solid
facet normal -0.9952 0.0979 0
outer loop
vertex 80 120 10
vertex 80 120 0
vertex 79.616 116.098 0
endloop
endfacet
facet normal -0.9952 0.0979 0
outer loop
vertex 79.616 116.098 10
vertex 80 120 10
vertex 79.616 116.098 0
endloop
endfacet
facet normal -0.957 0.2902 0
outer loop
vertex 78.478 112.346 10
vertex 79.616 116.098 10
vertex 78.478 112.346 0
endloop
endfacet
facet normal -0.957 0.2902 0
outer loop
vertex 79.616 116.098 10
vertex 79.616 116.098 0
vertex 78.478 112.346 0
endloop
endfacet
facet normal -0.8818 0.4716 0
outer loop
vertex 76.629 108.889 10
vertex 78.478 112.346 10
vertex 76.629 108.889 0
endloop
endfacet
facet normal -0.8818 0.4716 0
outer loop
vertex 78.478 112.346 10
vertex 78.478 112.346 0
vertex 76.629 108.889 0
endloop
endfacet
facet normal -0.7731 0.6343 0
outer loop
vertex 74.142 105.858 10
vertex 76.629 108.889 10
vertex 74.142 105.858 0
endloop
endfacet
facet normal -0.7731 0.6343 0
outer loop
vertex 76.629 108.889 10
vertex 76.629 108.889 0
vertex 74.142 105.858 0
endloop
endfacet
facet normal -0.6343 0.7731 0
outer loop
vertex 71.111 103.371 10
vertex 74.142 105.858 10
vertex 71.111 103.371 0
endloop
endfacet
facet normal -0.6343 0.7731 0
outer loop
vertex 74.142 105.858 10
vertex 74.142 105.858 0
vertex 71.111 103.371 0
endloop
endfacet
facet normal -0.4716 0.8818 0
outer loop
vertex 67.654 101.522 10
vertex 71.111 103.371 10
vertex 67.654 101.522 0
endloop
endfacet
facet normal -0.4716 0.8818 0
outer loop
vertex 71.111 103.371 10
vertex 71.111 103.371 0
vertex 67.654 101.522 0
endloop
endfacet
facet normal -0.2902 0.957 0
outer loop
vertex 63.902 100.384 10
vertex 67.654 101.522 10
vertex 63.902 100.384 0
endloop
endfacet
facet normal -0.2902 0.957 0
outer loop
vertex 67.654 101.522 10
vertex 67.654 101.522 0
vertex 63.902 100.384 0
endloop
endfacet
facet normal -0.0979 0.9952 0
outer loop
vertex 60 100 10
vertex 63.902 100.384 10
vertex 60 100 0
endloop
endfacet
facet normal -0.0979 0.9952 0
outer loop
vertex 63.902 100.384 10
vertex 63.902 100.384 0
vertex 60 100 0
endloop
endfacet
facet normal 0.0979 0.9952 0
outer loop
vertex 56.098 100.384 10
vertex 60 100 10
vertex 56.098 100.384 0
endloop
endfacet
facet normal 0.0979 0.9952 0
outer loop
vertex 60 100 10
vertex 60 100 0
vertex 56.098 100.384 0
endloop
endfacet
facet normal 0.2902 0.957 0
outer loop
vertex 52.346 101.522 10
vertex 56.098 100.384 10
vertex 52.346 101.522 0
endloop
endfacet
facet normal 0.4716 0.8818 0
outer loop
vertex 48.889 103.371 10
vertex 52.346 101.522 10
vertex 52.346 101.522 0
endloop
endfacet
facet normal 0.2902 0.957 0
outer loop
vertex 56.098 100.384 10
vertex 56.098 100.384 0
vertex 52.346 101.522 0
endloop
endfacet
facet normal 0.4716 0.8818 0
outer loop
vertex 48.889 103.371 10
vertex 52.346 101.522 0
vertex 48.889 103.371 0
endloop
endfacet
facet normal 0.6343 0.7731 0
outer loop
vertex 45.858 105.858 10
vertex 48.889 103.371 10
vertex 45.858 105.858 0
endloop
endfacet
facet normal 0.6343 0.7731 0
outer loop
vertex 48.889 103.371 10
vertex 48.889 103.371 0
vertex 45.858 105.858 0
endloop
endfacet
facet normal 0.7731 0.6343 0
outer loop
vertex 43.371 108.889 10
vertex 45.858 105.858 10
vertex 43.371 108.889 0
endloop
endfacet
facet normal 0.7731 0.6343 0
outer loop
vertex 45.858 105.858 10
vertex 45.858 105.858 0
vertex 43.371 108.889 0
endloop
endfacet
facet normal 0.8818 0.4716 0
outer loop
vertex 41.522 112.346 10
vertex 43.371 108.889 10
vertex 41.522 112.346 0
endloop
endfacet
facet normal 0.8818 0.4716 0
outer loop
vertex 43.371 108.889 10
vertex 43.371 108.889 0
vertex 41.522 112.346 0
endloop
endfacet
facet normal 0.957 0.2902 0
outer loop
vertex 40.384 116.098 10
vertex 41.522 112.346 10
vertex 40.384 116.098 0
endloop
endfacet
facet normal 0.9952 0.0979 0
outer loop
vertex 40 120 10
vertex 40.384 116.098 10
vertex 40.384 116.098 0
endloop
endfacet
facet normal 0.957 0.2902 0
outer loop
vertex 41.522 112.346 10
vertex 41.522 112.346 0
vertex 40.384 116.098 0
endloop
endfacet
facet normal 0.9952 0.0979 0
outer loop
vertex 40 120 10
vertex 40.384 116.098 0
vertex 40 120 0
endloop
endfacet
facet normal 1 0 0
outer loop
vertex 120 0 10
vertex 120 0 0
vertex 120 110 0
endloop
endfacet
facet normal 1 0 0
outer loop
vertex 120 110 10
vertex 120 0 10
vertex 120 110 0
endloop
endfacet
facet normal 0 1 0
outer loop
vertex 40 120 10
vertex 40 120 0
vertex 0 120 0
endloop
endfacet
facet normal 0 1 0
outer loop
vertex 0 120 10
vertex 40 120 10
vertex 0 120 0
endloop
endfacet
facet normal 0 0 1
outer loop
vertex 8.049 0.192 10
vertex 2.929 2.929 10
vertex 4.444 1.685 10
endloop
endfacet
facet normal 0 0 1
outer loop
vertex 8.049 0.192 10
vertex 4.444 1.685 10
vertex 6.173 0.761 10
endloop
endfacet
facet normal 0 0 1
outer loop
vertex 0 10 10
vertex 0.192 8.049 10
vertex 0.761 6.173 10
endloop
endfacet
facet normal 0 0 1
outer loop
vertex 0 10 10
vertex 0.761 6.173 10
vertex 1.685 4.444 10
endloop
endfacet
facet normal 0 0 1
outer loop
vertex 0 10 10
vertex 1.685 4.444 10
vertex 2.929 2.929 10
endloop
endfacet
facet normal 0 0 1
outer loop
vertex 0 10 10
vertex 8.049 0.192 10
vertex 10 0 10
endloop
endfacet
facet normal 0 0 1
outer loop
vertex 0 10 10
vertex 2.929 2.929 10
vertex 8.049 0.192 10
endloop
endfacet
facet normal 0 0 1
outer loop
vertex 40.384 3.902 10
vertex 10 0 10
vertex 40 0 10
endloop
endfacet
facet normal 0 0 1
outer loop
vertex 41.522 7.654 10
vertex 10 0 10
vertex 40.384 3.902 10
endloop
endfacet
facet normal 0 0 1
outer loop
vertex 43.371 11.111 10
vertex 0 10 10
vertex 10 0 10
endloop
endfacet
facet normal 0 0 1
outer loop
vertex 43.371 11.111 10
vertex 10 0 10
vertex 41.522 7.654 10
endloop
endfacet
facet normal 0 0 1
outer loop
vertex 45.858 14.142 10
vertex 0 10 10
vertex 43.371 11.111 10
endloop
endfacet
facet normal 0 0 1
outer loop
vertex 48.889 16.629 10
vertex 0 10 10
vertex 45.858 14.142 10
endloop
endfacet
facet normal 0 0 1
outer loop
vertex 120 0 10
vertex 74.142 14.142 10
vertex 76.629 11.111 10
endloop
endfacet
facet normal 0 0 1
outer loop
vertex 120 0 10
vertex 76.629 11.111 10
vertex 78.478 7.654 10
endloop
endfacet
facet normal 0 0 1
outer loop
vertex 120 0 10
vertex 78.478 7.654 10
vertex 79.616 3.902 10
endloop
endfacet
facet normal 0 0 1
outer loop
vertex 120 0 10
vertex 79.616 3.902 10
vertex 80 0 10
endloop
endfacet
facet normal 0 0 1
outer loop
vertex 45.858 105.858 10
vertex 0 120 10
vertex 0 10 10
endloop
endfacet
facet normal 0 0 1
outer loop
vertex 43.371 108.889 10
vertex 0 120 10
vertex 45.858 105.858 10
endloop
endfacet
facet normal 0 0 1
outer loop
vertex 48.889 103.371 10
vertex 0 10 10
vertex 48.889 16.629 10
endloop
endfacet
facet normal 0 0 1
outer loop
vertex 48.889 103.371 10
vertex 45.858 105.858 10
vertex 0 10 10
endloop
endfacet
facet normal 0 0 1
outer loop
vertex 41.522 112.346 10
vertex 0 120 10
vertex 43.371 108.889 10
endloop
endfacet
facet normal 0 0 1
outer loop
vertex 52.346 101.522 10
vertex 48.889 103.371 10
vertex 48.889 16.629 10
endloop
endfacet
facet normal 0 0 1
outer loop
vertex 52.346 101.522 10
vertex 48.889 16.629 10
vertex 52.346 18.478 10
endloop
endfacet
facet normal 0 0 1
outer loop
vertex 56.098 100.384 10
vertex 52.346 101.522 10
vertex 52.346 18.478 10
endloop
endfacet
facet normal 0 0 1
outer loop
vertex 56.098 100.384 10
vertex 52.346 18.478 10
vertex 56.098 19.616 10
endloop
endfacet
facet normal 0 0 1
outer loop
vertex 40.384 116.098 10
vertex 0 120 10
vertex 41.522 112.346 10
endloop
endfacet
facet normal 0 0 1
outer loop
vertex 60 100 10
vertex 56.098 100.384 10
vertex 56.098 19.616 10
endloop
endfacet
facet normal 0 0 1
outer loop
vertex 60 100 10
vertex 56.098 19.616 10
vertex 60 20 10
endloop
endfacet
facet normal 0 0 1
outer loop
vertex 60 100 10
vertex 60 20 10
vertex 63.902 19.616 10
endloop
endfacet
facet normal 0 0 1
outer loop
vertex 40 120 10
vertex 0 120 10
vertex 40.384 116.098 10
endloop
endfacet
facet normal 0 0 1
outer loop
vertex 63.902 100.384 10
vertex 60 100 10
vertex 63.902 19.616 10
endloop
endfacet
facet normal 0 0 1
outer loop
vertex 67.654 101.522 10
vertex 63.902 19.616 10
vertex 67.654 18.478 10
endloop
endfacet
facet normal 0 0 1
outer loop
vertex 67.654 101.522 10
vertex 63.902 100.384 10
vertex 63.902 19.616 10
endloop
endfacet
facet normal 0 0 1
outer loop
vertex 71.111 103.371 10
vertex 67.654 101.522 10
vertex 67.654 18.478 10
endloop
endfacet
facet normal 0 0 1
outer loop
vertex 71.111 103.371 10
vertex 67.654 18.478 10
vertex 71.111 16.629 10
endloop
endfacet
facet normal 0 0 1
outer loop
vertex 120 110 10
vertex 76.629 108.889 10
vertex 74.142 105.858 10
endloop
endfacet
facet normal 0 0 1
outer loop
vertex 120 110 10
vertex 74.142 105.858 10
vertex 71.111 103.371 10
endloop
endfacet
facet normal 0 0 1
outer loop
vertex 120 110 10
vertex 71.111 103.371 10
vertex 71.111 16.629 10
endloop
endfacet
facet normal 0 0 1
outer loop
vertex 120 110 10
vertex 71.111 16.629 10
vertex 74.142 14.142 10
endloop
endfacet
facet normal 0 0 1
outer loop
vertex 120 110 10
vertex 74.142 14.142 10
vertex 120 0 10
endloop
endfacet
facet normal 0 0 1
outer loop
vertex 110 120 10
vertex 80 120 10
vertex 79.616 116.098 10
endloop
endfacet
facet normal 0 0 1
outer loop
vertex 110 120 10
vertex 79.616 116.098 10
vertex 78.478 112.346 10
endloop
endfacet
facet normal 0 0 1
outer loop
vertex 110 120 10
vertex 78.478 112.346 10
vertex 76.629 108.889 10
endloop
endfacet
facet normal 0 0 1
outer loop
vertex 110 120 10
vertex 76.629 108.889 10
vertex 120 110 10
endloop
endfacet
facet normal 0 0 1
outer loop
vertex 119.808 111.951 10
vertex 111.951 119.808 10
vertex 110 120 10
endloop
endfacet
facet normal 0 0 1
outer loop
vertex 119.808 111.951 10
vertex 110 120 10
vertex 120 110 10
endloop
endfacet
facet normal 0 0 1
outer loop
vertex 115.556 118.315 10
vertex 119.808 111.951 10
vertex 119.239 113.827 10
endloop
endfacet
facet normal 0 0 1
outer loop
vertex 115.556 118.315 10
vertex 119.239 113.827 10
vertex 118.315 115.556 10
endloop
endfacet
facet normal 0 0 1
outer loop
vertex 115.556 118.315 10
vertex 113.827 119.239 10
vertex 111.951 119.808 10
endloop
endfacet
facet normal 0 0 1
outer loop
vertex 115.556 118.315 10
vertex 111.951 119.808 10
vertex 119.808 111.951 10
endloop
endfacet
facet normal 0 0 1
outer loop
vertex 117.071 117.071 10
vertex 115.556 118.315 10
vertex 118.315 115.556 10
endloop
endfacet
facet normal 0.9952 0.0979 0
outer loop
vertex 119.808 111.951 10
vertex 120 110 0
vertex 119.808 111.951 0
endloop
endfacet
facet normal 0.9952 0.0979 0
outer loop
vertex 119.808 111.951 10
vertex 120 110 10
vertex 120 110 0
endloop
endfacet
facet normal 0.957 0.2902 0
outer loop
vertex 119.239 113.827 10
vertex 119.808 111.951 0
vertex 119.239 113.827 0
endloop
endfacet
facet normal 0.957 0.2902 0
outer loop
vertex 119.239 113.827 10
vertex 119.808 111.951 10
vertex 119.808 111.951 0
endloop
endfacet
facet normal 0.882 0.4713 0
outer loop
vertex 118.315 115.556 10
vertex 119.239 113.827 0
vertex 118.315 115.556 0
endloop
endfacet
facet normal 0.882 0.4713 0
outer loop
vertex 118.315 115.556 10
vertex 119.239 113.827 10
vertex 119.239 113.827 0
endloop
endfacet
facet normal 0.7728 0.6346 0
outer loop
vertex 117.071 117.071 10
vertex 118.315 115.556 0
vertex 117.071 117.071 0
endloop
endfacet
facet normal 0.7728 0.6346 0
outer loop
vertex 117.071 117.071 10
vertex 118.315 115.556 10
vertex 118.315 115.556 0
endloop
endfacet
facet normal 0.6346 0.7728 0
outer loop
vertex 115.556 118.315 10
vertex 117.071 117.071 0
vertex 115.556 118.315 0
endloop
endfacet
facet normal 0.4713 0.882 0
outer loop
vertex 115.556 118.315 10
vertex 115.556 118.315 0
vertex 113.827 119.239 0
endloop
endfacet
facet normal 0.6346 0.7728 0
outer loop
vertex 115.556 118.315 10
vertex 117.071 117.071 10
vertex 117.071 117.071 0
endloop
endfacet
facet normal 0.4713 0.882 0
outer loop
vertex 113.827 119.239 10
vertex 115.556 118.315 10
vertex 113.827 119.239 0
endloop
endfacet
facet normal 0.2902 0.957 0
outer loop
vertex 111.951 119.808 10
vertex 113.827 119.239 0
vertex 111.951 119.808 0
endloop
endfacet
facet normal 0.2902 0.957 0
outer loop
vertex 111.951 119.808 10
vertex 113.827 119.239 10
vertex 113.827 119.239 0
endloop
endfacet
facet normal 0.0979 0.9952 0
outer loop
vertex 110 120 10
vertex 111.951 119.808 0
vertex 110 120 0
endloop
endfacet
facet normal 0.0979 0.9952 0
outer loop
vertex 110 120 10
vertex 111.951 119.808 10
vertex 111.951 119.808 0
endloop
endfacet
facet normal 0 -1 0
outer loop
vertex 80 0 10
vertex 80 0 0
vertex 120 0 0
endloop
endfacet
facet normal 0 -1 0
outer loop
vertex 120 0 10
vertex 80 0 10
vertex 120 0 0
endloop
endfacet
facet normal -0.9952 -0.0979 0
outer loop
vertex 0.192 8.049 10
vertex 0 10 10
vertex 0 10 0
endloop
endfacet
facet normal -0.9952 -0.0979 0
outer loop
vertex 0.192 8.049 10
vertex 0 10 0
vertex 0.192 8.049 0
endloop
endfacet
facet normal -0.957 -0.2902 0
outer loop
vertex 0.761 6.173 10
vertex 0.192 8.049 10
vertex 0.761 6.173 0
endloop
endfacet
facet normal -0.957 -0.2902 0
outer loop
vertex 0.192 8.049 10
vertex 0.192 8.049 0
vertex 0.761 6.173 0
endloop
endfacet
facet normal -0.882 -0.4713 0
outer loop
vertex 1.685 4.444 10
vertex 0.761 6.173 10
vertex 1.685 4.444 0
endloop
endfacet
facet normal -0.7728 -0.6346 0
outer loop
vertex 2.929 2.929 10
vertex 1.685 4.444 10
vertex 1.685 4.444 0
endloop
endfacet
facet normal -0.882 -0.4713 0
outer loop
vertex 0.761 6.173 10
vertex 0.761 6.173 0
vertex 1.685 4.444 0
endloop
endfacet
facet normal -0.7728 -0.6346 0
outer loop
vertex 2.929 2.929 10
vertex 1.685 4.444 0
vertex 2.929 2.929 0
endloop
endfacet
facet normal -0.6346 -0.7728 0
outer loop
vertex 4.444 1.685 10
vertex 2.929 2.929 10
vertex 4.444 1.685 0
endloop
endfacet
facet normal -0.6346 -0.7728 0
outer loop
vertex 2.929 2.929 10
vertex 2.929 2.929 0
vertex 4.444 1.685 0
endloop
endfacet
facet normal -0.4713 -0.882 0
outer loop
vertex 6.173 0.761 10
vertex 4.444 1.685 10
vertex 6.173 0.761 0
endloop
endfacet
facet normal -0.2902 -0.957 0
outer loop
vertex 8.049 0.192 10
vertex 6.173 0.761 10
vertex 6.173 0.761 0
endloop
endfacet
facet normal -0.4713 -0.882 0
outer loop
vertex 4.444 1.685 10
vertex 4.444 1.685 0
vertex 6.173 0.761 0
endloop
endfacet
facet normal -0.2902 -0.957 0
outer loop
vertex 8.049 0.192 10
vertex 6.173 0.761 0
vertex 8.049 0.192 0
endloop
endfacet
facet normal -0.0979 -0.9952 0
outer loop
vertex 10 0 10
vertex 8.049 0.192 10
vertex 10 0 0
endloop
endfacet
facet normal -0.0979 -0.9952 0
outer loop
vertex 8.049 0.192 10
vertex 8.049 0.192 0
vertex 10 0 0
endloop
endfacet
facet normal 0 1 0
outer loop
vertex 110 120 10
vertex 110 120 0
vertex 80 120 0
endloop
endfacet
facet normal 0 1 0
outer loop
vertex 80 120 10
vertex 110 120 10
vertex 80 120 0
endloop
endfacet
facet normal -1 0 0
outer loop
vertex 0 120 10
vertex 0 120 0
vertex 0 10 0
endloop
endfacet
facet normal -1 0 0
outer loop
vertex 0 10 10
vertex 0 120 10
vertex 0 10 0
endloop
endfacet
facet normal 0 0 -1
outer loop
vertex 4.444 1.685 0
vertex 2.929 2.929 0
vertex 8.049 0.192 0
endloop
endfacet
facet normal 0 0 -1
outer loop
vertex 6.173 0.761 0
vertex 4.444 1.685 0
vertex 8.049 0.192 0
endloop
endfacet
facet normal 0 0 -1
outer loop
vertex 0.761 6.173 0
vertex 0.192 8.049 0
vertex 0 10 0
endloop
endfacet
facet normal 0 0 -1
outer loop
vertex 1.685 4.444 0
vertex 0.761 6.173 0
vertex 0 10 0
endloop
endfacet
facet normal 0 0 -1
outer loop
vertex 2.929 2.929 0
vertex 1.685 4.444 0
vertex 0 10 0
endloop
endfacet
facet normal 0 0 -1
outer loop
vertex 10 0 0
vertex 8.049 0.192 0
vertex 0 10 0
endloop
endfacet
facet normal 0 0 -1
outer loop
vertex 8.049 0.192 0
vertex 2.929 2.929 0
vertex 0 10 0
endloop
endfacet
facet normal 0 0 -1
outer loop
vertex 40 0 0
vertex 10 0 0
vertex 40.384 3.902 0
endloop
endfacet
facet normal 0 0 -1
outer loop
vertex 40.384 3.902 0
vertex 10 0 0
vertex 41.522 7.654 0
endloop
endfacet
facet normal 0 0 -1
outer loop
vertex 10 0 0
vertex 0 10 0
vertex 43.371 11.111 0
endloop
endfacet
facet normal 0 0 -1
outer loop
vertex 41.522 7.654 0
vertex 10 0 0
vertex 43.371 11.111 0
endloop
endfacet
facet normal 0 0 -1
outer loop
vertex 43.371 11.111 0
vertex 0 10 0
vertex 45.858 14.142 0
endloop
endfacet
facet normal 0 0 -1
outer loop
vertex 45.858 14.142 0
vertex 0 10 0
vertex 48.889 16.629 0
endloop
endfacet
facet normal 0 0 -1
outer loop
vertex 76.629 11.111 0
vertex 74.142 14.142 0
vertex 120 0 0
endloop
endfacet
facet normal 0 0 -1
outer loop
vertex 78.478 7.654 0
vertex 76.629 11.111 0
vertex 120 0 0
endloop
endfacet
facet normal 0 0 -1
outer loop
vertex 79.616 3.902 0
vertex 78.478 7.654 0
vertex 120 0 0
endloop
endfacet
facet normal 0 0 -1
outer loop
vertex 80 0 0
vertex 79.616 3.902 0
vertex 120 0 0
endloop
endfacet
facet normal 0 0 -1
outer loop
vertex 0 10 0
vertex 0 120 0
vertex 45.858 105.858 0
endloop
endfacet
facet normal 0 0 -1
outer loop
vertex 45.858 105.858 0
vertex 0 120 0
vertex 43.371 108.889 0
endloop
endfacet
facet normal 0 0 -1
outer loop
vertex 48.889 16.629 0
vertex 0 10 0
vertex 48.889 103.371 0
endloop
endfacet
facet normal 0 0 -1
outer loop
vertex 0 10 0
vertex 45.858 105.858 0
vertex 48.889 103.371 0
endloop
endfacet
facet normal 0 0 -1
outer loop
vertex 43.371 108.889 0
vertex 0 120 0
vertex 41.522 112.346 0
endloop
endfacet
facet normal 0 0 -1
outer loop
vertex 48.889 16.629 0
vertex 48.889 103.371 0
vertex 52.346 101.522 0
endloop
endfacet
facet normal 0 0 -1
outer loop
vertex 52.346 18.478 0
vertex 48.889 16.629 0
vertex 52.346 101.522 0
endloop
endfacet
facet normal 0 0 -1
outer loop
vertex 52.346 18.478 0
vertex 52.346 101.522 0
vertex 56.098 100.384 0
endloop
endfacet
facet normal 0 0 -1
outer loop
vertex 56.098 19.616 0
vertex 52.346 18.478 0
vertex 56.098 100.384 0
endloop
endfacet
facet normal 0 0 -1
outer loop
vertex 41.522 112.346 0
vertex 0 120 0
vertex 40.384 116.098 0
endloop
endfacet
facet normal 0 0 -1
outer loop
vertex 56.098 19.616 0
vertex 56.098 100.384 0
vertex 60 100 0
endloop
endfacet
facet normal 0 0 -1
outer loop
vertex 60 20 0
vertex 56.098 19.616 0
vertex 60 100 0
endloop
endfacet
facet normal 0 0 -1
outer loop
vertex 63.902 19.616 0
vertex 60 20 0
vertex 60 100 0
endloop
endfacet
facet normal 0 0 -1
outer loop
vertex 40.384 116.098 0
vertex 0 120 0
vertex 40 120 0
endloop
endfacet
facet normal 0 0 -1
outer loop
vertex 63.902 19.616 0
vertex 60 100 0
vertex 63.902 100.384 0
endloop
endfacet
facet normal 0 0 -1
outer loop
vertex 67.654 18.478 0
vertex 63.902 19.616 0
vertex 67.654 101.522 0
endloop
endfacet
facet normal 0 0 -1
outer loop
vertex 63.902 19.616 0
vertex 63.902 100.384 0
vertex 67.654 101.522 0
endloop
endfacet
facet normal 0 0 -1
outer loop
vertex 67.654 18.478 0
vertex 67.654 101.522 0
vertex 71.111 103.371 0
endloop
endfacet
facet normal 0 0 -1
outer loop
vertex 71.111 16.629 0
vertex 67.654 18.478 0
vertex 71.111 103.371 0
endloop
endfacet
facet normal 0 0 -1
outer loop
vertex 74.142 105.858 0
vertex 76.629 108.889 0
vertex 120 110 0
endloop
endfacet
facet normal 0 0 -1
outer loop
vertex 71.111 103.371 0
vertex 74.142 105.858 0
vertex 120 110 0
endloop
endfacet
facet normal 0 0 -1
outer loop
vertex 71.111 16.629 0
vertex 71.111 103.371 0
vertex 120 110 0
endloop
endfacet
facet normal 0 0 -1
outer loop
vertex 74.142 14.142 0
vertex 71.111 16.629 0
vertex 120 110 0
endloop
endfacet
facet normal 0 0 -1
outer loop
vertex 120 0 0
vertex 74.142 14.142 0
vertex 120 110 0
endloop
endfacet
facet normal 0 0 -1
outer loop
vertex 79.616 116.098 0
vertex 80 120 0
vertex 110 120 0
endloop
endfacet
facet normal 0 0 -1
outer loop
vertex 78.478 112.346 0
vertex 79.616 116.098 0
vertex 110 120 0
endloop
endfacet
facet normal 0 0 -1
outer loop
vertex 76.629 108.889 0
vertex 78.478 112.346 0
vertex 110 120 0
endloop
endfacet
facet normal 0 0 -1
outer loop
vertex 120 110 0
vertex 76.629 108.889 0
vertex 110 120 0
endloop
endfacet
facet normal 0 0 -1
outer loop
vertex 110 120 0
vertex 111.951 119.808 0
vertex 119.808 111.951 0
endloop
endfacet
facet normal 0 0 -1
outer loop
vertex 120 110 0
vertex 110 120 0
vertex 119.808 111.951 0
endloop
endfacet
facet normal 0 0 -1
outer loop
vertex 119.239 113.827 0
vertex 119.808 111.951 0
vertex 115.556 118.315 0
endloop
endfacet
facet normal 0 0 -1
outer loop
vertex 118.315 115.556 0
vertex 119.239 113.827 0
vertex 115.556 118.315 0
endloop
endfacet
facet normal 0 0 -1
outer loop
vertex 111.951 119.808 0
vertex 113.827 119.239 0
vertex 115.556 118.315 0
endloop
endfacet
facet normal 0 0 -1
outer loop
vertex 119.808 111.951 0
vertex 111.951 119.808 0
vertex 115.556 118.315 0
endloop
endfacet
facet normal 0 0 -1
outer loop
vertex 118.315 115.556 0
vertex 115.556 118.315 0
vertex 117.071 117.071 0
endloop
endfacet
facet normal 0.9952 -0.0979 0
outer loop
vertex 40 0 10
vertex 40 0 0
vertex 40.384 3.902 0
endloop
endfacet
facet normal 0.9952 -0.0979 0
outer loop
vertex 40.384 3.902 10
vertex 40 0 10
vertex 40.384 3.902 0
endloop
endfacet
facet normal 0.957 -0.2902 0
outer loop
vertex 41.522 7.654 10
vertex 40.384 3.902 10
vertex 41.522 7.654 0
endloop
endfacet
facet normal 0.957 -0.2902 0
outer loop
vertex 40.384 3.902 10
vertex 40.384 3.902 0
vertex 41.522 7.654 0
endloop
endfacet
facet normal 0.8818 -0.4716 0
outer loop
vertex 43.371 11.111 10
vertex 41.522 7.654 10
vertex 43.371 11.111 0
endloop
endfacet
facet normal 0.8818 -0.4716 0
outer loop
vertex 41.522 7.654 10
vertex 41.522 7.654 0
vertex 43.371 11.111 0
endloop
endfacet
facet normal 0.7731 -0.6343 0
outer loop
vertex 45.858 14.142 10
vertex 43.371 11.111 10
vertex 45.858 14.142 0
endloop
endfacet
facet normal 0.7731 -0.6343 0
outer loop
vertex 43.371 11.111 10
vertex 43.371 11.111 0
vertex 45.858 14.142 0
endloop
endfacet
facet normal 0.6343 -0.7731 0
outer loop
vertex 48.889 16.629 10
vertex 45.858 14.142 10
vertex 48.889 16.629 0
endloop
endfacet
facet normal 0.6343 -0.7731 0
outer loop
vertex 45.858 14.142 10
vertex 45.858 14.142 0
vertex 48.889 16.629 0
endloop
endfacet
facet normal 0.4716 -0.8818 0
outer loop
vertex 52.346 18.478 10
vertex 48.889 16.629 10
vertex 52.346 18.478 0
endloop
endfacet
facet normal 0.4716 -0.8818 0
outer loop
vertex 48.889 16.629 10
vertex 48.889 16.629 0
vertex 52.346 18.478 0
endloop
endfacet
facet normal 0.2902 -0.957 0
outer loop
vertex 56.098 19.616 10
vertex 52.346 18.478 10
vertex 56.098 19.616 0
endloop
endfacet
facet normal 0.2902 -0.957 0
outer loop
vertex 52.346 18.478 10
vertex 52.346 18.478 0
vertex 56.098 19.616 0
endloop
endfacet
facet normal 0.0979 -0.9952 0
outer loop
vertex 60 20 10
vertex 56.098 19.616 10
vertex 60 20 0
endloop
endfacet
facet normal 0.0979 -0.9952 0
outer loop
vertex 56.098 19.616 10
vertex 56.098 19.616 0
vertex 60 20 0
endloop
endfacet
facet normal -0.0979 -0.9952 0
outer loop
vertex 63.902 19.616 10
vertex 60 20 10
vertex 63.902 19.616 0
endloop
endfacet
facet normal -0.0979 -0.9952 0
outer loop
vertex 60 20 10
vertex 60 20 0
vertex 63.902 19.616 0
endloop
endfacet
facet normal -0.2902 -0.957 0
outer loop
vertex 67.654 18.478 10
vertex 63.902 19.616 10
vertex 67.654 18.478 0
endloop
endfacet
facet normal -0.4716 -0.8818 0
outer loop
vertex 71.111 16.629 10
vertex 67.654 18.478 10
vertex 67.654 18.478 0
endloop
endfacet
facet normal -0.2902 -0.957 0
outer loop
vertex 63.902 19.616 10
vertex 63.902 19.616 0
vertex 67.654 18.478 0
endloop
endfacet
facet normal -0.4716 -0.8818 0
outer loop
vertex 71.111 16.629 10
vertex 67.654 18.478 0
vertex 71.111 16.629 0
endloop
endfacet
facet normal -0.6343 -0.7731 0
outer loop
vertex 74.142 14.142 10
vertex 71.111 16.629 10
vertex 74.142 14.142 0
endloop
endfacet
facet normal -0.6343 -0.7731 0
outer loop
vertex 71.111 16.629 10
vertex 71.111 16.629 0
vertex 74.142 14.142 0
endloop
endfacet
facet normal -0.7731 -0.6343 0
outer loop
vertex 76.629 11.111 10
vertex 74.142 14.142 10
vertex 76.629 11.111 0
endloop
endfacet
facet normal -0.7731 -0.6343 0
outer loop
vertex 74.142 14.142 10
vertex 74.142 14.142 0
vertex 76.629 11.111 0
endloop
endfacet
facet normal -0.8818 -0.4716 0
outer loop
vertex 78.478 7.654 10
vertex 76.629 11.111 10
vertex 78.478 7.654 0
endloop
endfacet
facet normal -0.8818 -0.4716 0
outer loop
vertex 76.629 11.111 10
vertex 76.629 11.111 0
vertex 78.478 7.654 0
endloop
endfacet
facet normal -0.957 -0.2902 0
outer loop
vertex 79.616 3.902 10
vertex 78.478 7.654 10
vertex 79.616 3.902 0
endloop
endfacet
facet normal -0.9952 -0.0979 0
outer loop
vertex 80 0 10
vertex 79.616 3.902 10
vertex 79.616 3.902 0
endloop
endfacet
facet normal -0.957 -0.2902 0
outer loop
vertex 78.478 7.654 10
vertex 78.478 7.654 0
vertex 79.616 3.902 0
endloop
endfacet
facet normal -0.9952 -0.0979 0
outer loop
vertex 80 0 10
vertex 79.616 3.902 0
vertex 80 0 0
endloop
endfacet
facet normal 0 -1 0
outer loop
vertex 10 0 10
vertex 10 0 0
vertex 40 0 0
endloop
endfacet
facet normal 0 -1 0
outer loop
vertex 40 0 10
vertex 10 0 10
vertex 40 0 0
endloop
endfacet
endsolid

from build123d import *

# Parameters (mm, degrees)
F1_DEPTH = 10
F2_R     = 10


with BuildPart() as f1:
    # F0 (on Top) → F1 (new body)
    with BuildSketch(Plane.XY):
        with BuildLine():
            ThreePointArc((0, 10), (2.928932, 2.928932), (10, 0))
            Line((10, 0), (40, 0))
            ThreePointArc((40, 0), (60, 20), (80, 0))
            Line((80, 0), (120, 0))
            Line((120, 0), (120, 120))
            Line((120, 120), (80, 120))
            ThreePointArc((80, 120), (60, 100), (40, 120))
            Line((40, 120), (0, 120))
            Line((0, 120), (0, 10))
        make_face()
    extrude(amount=F1_DEPTH)

    # F2
    f2_edges = [f1.edges().sort_by_distance(p)[0] for p in [
        (120, 120, 5),
    ]]
    fillet(f2_edges, radius=F2_R)


solid = f1.part
